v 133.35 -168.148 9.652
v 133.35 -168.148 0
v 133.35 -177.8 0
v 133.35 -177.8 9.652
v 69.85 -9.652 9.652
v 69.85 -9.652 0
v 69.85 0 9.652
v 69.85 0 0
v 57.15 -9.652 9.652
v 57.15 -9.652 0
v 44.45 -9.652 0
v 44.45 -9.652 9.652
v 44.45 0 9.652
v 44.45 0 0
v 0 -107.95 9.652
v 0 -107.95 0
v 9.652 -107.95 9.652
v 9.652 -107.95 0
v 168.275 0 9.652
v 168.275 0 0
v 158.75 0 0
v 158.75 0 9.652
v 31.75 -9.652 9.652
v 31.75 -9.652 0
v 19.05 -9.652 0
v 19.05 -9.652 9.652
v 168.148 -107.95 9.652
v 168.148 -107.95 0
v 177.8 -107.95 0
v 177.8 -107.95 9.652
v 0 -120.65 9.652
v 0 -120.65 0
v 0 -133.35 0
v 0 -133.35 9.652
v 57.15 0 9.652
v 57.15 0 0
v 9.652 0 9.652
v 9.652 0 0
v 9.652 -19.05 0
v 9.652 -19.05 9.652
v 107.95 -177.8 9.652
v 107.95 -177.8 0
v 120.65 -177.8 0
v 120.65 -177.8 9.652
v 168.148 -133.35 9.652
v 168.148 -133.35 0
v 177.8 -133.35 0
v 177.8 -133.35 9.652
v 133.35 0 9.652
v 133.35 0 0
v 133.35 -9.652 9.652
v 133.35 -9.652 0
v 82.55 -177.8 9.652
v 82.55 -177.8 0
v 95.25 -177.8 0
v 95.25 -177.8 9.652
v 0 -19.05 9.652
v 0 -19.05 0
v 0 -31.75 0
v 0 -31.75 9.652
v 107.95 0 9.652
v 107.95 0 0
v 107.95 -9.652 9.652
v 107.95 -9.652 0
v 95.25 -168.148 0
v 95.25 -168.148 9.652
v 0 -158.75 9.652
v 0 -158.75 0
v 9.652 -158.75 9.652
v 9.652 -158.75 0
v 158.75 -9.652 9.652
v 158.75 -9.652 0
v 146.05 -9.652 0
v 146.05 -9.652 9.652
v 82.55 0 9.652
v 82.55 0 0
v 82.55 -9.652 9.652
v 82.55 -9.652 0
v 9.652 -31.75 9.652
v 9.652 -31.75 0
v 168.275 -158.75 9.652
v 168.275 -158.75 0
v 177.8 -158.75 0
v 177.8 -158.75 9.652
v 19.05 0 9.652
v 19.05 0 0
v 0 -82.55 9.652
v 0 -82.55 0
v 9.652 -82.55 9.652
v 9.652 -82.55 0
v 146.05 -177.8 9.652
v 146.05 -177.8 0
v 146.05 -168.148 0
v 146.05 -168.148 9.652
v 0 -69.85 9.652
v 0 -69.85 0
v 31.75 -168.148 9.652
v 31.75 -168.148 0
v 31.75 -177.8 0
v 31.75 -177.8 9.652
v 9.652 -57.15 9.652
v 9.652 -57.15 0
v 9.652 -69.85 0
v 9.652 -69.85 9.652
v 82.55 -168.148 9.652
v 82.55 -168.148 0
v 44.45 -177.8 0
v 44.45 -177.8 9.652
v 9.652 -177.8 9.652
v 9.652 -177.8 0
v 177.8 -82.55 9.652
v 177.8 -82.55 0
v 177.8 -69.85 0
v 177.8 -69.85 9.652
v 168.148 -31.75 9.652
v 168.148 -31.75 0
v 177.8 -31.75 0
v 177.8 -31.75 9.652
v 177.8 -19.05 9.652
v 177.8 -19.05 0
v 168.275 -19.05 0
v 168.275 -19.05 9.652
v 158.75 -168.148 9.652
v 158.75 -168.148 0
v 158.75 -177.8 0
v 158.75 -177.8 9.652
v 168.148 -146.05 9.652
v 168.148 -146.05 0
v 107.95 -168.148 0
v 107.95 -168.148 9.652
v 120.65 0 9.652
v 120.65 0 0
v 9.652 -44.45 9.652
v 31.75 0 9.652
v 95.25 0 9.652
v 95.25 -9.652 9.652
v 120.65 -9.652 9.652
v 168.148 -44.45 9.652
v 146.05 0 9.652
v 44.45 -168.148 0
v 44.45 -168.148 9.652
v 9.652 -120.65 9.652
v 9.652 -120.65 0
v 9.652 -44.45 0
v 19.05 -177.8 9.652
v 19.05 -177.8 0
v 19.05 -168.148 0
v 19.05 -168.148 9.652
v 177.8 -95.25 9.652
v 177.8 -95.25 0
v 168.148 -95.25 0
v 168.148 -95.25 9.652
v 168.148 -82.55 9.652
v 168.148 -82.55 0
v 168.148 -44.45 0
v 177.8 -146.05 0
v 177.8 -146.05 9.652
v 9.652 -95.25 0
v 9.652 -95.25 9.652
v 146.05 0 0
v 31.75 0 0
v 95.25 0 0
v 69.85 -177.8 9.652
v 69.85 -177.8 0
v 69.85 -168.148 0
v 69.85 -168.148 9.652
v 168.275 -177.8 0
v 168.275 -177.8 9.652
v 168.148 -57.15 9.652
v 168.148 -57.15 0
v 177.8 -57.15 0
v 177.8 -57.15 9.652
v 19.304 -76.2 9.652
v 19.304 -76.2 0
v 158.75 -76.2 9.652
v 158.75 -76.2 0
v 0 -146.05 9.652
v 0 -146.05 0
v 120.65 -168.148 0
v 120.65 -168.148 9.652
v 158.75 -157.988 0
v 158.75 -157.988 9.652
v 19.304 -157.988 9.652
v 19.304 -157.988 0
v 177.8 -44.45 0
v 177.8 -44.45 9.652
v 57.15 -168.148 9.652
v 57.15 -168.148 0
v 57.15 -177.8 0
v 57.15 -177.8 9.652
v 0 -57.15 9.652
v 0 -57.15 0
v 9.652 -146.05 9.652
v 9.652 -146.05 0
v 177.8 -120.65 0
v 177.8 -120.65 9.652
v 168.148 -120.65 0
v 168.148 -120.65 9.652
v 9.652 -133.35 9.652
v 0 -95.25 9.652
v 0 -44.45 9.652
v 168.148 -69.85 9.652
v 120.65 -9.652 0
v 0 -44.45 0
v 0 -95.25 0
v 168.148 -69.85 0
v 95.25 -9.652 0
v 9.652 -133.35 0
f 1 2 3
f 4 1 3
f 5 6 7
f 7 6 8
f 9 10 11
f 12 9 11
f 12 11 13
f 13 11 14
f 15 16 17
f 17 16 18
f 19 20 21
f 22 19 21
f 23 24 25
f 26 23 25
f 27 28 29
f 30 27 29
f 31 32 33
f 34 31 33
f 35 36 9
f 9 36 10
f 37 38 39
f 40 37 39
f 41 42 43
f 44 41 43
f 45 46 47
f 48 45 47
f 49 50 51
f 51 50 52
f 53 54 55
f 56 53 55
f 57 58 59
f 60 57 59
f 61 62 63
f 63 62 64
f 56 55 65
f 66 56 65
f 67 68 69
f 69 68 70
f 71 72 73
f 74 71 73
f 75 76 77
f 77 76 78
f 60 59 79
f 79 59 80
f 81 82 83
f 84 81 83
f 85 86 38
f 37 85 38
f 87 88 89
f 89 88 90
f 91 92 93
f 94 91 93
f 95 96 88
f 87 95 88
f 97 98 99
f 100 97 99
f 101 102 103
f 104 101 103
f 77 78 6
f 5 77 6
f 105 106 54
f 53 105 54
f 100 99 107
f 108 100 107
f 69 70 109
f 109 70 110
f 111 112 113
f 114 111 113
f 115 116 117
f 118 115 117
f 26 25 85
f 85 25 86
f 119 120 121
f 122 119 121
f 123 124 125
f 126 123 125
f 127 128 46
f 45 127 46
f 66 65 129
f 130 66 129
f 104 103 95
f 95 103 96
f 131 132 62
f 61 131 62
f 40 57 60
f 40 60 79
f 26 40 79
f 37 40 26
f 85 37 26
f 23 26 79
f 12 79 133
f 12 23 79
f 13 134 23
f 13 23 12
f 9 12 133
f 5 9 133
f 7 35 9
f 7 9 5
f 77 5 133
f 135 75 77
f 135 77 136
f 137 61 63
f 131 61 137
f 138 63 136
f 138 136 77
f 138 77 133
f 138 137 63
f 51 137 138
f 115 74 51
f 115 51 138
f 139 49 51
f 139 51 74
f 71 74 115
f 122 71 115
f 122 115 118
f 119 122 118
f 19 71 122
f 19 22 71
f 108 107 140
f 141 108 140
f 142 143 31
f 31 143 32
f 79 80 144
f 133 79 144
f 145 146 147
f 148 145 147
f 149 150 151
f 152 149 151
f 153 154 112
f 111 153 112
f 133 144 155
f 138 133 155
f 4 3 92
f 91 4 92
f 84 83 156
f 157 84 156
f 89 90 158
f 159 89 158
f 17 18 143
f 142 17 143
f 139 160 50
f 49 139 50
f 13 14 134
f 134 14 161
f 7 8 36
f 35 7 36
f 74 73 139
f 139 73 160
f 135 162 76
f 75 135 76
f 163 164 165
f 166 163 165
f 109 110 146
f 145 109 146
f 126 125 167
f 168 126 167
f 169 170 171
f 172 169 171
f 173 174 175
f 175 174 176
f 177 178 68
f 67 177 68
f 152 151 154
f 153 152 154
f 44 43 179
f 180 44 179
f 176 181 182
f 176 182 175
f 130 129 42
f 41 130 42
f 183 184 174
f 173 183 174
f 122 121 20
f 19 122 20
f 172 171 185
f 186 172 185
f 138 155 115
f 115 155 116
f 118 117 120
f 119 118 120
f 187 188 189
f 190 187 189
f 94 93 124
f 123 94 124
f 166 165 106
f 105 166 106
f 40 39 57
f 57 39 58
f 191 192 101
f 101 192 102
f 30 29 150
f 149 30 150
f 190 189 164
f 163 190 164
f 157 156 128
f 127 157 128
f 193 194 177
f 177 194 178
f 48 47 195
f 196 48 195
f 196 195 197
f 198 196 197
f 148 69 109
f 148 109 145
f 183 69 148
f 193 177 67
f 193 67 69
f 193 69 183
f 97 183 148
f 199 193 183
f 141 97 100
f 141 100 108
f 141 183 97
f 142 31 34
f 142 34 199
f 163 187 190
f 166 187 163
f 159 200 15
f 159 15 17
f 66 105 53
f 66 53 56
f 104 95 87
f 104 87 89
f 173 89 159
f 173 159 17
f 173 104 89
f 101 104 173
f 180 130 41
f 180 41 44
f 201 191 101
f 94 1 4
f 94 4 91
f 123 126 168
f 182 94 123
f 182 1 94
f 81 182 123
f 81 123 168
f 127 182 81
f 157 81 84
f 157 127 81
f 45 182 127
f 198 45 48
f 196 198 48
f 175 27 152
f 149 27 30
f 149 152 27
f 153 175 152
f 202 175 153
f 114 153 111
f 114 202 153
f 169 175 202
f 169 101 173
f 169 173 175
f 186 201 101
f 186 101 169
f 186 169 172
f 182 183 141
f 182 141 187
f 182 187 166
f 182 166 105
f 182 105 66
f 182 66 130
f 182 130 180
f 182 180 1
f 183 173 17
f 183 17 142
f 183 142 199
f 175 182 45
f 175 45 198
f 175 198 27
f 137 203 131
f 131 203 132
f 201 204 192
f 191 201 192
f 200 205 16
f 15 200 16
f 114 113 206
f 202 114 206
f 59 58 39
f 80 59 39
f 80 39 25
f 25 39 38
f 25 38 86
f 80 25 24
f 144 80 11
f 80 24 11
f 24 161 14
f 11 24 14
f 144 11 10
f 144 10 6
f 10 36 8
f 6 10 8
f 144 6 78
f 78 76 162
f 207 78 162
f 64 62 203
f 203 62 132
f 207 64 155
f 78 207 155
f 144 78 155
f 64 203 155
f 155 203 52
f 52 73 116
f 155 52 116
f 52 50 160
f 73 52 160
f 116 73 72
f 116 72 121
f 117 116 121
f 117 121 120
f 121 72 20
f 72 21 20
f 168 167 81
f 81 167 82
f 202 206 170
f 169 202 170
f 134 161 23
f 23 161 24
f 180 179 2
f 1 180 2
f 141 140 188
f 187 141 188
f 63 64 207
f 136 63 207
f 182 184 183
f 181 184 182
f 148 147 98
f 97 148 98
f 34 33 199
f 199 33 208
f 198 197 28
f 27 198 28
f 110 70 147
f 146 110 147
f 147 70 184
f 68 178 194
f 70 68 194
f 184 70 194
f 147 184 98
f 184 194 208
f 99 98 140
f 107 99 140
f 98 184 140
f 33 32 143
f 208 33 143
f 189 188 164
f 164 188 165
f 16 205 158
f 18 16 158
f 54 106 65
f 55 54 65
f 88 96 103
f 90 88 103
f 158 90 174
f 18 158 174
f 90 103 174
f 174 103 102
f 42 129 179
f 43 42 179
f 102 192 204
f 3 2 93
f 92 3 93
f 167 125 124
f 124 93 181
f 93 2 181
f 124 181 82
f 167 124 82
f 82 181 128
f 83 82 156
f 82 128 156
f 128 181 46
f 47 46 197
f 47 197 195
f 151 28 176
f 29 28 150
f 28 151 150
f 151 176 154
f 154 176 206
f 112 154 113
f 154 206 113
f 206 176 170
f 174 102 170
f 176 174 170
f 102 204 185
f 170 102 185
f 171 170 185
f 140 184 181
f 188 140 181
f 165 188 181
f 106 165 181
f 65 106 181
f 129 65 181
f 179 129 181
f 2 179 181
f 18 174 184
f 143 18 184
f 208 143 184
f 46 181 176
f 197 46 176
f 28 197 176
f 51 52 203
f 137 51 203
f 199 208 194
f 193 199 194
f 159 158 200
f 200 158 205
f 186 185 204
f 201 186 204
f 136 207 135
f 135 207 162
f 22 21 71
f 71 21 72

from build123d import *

# Parameters (mm, degrees)
F0_W     = 139.446
F0_H     = 81.788
F1_DEPTH = 9.652
F2_DEPTH = 9.652


with BuildPart() as f1:
    # F0 (on Top) → F1 (new body)
    with BuildSketch(Plane.XY):
        Polygon((168.148, -44.45), (9.652, -44.45), (0, -44.45), (0, -57.15), (9.652, -57.15), (9.652, -69.85), (0, -69.85), (0, -82.55), (9.652, -82.55), (9.652, -95.25), (0, -95.25), (0, -107.95), (9.652, -107.95), (9.652, -120.65), (0, -120.65), (0, -133.35), (9.652, -133.35), (9.652, -146.05), (0, -146.05), (0, -158.75), (9.652, -158.75), (9.652, -177.8), (19.05, -177.8), (19.05, -168.148), (31.75, -168.148), (31.75, -177.8), (44.45, -177.8), (44.45, -168.148), (57.15, -168.148), (57.15, -177.8), (69.85, -177.8), (69.85, -168.148), (82.55, -168.148), (82.55, -177.8), (95.25, -177.8), (95.25, -168.148), (107.95, -168.148), (107.95, -177.8), (120.65, -177.8), (120.65, -168.148), (133.35, -168.148), (133.35, -177.8), (146.05, -177.8), (146.05, -168.148), (158.75, -168.148), (158.75, -177.8), (168.275, -177.8), (168.275, -158.75), (177.8, -158.75), (177.8, -146.05), (168.148, -146.05), (168.148, -133.35), (177.8, -133.35), (177.8, -120.65), (168.148, -120.65), (168.148, -107.95), (177.8, -107.95), (177.8, -95.25), (168.148, -95.25), (168.148, -82.55), (177.8, -82.55), (177.8, -69.85), (168.148, -69.85), (168.148, -57.15), (177.8, -57.15), (177.8, -44.45), align=None)
        with Locations((89.027, -117.094)):
            Rectangle(F0_W, F0_H, mode=Mode.SUBTRACT)
    extrude(amount=F1_DEPTH)


with BuildPart() as f2:
    # F0 (on Top) → F2 (new body)
    with BuildSketch(Plane.XY):
        Polygon((19.05, 0), (9.652, 0), (9.652, -19.05), (0, -19.05), (0, -31.75), (9.652, -31.75), (9.652, -44.45), (168.148, -44.45), (168.148, -31.75), (177.8, -31.75), (177.8, -19.05), (168.275, -19.05), (168.275, 0), (158.75, 0), (158.75, -9.652), (146.05, -9.652), (146.05, 0), (133.35, 0), (133.35, -9.652), (120.65, -9.652), (120.65, 0), (107.95, 0), (107.95, -9.652), (95.25, -9.652), (95.25, 0), (82.55, 0), (82.55, -9.652), (69.85, -9.652), (69.85, 0), (57.15, 0), (57.15, -9.652), (44.45, -9.652), (44.45, 0), (31.75, 0), (31.75, -9.652), (19.05, -9.652), align=None)
    extrude(amount=F2_DEPTH)


solid = Compound([f1.part, f2.part])
